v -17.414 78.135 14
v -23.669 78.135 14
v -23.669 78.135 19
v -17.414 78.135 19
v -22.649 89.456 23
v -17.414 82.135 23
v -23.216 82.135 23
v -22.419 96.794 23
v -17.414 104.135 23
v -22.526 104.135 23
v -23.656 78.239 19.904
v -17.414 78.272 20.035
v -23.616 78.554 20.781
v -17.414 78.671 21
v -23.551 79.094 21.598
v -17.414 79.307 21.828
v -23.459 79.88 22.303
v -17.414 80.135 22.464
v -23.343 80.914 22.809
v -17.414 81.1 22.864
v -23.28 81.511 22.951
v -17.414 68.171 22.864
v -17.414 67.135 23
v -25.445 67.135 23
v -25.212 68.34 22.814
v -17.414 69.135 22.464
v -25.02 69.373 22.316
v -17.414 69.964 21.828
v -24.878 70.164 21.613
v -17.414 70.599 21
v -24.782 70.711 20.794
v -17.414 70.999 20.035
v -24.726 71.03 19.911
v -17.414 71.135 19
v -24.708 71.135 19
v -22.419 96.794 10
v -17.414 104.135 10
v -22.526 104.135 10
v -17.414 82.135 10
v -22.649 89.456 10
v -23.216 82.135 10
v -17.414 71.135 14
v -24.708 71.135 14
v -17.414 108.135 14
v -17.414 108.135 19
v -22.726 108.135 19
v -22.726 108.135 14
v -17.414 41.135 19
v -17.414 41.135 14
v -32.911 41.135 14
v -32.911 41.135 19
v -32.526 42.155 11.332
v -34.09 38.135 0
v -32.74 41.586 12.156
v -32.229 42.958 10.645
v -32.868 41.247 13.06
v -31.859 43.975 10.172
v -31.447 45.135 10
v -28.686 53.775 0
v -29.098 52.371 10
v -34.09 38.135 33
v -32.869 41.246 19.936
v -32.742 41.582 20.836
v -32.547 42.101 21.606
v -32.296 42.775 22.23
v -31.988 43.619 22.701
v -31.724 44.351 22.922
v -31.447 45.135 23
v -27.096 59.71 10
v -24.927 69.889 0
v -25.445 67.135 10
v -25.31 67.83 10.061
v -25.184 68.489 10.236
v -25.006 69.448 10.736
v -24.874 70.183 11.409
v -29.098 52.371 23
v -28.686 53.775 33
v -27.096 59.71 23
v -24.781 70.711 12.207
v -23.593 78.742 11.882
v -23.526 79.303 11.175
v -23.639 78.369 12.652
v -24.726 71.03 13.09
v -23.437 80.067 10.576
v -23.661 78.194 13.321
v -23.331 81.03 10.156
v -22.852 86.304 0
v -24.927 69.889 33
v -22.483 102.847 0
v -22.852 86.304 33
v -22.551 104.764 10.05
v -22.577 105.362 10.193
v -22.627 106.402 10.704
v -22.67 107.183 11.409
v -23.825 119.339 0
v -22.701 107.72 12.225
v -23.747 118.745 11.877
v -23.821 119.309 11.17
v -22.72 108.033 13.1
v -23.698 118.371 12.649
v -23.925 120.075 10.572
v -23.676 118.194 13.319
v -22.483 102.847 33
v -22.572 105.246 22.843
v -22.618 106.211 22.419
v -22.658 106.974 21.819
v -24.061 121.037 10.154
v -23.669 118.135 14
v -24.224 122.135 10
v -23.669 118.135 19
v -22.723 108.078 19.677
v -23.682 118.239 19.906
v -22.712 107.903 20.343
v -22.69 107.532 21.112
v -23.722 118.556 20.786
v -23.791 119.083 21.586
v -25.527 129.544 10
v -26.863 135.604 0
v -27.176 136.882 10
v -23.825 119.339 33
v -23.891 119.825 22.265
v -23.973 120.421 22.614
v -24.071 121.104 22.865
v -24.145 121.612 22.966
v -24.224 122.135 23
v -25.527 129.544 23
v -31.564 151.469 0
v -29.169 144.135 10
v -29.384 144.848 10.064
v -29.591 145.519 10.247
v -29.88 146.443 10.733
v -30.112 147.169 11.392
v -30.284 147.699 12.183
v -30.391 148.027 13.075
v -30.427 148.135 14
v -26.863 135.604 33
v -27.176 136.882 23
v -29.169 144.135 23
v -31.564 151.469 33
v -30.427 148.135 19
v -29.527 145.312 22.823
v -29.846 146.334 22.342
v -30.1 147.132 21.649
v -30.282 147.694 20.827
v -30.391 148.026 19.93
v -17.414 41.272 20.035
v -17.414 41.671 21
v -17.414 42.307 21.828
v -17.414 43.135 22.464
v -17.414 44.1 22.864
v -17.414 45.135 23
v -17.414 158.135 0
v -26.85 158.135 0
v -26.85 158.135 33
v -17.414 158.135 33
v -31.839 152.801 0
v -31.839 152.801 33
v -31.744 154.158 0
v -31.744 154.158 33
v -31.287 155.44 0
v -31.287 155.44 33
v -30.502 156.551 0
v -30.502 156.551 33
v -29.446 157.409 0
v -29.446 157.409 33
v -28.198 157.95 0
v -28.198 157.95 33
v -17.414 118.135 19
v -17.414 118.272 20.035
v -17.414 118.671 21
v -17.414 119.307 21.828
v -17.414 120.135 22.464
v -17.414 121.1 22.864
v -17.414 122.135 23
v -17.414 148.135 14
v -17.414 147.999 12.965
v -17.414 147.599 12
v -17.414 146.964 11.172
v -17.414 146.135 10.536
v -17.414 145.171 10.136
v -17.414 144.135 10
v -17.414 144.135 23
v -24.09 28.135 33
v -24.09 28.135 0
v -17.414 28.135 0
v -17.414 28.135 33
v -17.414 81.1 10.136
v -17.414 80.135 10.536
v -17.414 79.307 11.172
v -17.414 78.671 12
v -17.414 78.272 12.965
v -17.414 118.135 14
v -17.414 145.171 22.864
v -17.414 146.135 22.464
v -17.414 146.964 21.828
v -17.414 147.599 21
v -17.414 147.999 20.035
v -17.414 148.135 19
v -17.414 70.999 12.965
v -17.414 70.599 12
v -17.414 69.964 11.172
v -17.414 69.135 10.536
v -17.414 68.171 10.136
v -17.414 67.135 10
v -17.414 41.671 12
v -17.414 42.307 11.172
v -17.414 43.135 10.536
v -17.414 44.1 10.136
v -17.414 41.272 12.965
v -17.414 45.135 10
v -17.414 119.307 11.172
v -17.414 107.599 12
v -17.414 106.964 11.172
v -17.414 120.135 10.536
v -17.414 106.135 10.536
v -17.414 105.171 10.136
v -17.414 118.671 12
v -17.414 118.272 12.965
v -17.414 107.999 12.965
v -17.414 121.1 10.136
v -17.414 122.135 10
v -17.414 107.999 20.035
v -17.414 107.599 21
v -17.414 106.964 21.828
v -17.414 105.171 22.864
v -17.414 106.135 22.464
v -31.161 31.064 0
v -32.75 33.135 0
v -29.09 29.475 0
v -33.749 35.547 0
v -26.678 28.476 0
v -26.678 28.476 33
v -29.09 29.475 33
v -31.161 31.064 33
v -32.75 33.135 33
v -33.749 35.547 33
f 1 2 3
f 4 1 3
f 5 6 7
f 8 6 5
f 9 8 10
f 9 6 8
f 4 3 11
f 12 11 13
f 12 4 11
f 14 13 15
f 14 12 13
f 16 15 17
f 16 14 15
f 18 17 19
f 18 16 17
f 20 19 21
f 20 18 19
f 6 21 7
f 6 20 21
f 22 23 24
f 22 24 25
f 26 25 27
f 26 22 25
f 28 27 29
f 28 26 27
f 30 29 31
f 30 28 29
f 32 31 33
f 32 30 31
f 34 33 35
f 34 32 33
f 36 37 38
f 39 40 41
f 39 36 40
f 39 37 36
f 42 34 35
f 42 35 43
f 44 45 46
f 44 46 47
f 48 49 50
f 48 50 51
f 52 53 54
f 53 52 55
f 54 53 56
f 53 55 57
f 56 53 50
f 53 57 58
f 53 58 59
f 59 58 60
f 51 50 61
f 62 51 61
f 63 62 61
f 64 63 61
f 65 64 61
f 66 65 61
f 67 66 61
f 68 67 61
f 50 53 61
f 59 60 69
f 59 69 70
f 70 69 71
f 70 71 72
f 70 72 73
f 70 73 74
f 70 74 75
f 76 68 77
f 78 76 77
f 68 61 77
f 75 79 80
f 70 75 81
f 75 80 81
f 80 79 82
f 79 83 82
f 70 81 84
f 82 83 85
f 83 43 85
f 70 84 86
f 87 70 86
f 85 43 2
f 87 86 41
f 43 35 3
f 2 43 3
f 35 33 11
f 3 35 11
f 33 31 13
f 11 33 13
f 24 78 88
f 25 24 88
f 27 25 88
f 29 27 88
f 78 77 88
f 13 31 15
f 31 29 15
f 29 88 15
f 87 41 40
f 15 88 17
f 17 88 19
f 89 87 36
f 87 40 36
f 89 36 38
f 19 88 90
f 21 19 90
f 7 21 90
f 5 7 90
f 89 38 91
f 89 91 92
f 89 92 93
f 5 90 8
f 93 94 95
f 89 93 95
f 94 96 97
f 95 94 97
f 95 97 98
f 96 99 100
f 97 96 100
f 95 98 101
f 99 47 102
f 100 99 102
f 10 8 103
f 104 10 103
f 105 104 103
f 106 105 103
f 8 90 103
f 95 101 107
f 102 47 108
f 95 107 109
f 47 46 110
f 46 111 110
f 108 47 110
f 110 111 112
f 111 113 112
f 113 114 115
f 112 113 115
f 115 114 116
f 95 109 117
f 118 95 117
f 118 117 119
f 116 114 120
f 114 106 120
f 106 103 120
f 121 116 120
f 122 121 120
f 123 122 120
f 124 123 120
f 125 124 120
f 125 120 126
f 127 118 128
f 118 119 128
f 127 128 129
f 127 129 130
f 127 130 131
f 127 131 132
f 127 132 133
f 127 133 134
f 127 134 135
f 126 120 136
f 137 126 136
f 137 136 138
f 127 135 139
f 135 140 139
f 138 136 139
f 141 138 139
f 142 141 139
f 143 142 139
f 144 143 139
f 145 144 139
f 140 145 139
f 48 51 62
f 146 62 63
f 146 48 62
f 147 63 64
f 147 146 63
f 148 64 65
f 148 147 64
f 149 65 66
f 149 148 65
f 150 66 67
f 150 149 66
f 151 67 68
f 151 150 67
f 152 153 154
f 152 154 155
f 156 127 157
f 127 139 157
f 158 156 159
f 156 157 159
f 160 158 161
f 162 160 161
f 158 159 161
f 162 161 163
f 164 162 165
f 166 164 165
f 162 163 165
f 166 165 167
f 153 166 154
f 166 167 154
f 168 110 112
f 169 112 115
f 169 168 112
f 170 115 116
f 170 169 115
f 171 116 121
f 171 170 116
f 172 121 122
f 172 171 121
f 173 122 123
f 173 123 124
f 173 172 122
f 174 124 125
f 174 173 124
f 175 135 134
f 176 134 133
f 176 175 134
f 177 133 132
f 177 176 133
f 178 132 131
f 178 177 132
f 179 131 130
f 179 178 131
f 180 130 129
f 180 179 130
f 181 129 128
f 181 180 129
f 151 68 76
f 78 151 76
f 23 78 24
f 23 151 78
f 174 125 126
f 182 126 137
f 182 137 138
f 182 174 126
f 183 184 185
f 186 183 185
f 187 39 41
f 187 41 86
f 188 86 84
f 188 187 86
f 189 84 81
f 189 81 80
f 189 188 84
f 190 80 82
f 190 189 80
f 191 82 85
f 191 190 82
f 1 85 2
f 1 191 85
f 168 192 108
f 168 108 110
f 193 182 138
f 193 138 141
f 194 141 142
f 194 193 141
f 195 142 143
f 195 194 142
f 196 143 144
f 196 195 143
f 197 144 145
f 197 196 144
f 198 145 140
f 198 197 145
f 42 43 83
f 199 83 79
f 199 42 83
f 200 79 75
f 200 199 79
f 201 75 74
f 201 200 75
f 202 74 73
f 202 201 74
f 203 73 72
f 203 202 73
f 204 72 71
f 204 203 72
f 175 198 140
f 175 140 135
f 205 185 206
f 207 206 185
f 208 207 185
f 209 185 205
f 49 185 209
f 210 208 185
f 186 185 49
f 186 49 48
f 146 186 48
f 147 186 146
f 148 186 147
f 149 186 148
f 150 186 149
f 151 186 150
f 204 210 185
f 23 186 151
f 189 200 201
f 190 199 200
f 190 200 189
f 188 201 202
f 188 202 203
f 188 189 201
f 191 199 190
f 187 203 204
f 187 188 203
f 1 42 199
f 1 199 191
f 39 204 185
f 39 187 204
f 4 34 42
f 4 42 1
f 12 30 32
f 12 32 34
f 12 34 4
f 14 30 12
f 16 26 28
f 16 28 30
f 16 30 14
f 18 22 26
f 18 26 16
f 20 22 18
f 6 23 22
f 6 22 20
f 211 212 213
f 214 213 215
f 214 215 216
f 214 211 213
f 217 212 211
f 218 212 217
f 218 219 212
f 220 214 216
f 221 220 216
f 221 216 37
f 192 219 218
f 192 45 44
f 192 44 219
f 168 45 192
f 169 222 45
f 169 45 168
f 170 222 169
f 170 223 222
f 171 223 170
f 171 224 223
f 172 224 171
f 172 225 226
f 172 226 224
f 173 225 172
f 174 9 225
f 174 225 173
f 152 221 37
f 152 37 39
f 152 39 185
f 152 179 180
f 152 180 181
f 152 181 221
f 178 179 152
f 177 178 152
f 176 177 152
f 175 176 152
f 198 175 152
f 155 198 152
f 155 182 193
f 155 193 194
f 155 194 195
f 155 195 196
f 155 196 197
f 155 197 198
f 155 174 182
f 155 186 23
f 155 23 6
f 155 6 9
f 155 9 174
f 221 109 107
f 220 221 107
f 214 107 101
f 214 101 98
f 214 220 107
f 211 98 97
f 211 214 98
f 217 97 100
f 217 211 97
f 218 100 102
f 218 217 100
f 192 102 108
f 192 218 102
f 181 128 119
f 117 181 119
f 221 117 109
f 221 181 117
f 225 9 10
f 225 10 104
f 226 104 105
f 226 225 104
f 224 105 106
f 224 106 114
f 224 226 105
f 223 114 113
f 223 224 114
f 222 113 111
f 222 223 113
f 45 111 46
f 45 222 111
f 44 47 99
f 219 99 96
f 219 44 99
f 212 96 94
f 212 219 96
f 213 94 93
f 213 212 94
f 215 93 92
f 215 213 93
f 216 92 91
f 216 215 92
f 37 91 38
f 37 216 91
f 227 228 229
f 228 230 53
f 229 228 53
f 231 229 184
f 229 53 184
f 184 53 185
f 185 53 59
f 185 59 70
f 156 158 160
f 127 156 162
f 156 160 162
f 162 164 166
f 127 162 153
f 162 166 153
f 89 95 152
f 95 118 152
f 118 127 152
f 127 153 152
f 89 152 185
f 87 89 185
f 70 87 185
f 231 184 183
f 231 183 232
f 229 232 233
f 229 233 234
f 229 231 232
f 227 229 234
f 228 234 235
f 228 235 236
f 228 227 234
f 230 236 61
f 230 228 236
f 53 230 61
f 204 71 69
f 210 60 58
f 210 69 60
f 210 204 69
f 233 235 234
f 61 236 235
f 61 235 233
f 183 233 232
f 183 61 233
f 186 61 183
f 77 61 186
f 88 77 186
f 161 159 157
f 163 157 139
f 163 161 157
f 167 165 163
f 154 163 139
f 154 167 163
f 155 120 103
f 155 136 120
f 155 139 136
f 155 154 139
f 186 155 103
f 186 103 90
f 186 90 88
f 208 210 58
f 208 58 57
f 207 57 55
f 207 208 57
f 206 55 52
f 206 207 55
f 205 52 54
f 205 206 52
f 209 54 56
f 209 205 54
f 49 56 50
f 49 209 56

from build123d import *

# Parameters (mm, degrees)
RESSALTO_EXTRUS_O1_DEPTH = 33
FILETE1_START            = -1
FILETE1_DEPTH            = 35
FILETE1_2_DEPTH          = 33
CORTE_EXTRUS_O2_DEPTH    = 166.099690852
ESBO_O4_W                = 39.149175328
ESBO_O4_H                = 26.52668984
CORTE_EXTRUS_O3_DEPTH    = 166.099690852
ESBO_O5_W                = 74.27128815
ESBO_O5_H                = 142.377248688
CORTE_EXTRUS_O4_DEPTH    = 166.099690852
FILETE2_R                = 5
CORTE_EXTRUS_O5_DEPTH    = 163.400408603


with BuildPart() as part:
    # Esboço1 → Ressalto-extrusão1 (new body)
    with BuildSketch(Plane.XY):
        with BuildLine():
            Line((-14.089663978, 13.135393664), (-14.089663978, 28.135393664))
            Line((-14.089663978, 28.135393664), (-34.089663978, 28.135393664))
            Line((-34.089663978, 28.135393664), (-34.089663978, 158.135393664))
            Line((-34.089663978, 158.135393664), (25.910336022, 158.135393664))
            Line((25.910336022, 158.135393664), (25.910336022, 28.135393664))
            Line((25.910336022, 28.135393664), (5.910336022, 28.135393664))
            Line((5.910336022, 28.135393664), (5.910336022, 13.135393664))
            ThreePointArc((5.910336022, 13.135393664), (-4.089663978, 3.135393664), (-14.089663978, 13.135393664))
        make_face()
    extrude(amount=RESSALTO_EXTRUS_O1_DEPTH)

    # Filete1: read off the stored shape, not the designer's step
    # Filete1 outline → Filete1 (cut)
    with BuildSketch(Plane.XY.offset(FILETE1_START)):
        with BuildLine():
            Line((25.910336022, 28.135393664), (25.910336022, 38.135393664))
            ThreePointArc((25.910336022, 38.135393664), (22.981403834, 31.064325852), (15.910336022, 28.135393664))
            Line((15.910336022, 28.135393664), (25.910336022, 28.135393664))
        make_face()
        with BuildLine():
            Line((-34.089663978, 28.135393664), (-24.089663978, 28.135393664))
            ThreePointArc((-24.089663978, 28.135393664), (-31.160731789, 31.064325853), (-34.089663978, 38.135393664))
            Line((-34.089663978, 38.135393664), (-34.089663978, 28.135393664))
        make_face()
    extrude(amount=FILETE1_DEPTH, mode=Mode.SUBTRACT)

    # Filete1 2 outline → Filete1 2 (add)
    with BuildSketch(Plane.XY):
        with BuildLine():
            ThreePointArc((5.910336022, 18.135393664), (8.83926821, 25.206461475), (15.910336022, 28.135393664))
            Line((15.910336022, 28.135393664), (5.910336022, 28.135393664))
            Line((5.910336022, 28.135393664), (5.910336022, 18.135393664))
        make_face()
        with BuildLine():
            ThreePointArc((-24.089663978, 28.135393664), (-17.018596166, 25.206461476), (-14.089663978, 18.135393664))
            Line((-14.089663978, 18.135393664), (-14.089663978, 28.135393664))
            Line((-14.089663978, 28.135393664), (-24.089663978, 28.135393664))
        make_face()
    extrude(amount=FILETE1_2_DEPTH)

    # Esboço3 → Corte-extrusão2 (cut, through all)
    with BuildSketch(Plane.XY.offset(33)):
        with BuildLine():
            ThreePointArc((-34.089663978, 38.135393664), (-22.413633719, 98.135393664), (-34.089663978, 158.135393664))
            Line((-34.089663978, 158.135393664), (-34.089663978, 38.135393664))
        make_face()
        with BuildLine():
            ThreePointArc((25.910336022, 38.135393664), (14.234305764, 98.135393664), (25.910336022, 158.135393664))
            Line((25.910336022, 158.135393664), (25.910336022, 38.135393664))
        make_face()
    extrude(amount=-CORTE_EXTRUS_O2_DEPTH, mode=Mode.SUBTRACT)

    # Esboço4 → Corte-extrusão3 (cut, through all)
    with BuildSketch(Plane.XY.offset(33)):
        with Locations((-4.515076314, 14.872048744)):
            Rectangle(ESBO_O4_W, ESBO_O4_H)
    extrude(amount=-CORTE_EXTRUS_O3_DEPTH, mode=Mode.SUBTRACT)

    # Esboço5 → Corte-extrusão4 (cut, through all)
    with BuildSketch(Plane.XY.offset(33)):
        with Locations((19.722010356, 86.94676932)):
            Rectangle(ESBO_O5_W, ESBO_O5_H)
    extrude(amount=-CORTE_EXTRUS_O4_DEPTH, mode=Mode.SUBTRACT)

    # Filete2
    filete2_edges = [part.edges().sort_by_distance(p)[0] for p in [
        (-34.089663978, 158.135393664, 16.5),
    ]]
    fillet(filete2_edges, radius=FILETE2_R)

    # Esboço6 → Corte-extrusão5 (cut, through all)
    with BuildSketch(Plane(origin=(-17.413633719, 0, 0), x_dir=(0, 0, -1), z_dir=(1, 0, 0))):
        with BuildLine():
            Line((-19, 148.135393664), (-14, 148.135393664))
            ThreePointArc((-14, 148.135393664), (-11.171572875, 146.963820789), (-10, 144.135393664))
            Line((-10, 144.135393664), (-10, 122.135393664))
            ThreePointArc((-10, 122.135393664), (-11.171572875, 119.306966539), (-14, 118.135393664))
            Line((-14, 118.135393664), (-19, 118.135393664))
            ThreePointArc((-19, 118.135393664), (-21.828427125, 119.306966539), (-23, 122.135393664))
            Line((-23, 122.135393664), (-23, 144.135393664))
            ThreePointArc((-23, 144.135393664), (-21.828427125, 146.963820789), (-19, 148.135393664))
        make_face()
        with BuildLine():
            Line((-19, 108.135393664), (-14, 108.135393664))
            ThreePointArc((-14, 108.135393664), (-11.171572875, 106.963820789), (-10, 104.135393664))
            Line((-10, 104.135393664), (-10, 82.135393664))
            ThreePointArc((-10, 82.135393664), (-11.171572875, 79.306966539), (-14, 78.135393664))
            Line((-14, 78.135393664), (-19, 78.135393664))
            ThreePointArc((-19, 78.135393664), (-21.828427125, 79.306966539), (-23, 82.135393664))
            Line((-23, 82.135393664), (-23, 104.135393664))
            ThreePointArc((-23, 104.135393664), (-21.828427125, 106.963820789), (-19, 108.135393664))
        make_face()
        with BuildLine():
            Line((-19, 71.135393664), (-14, 71.135393664))
            ThreePointArc((-14, 71.135393664), (-11.171572875, 69.963820789), (-10, 67.135393664))
            Line((-10, 67.135393664), (-10, 45.135393664))
            ThreePointArc((-10, 45.135393664), (-11.171572875, 42.306966539), (-14, 41.135393664))
            Line((-14, 41.135393664), (-19, 41.135393664))
            ThreePointArc((-19, 41.135393664), (-21.828427125, 42.306966539), (-23, 45.135393664))
            Line((-23, 45.135393664), (-23, 67.135393664))
            ThreePointArc((-23, 67.135393664), (-21.828427125, 69.963820789), (-19, 71.135393664))
        make_face()
    extrude(amount=-CORTE_EXTRUS_O5_DEPTH, mode=Mode.SUBTRACT)


solid = part.part
